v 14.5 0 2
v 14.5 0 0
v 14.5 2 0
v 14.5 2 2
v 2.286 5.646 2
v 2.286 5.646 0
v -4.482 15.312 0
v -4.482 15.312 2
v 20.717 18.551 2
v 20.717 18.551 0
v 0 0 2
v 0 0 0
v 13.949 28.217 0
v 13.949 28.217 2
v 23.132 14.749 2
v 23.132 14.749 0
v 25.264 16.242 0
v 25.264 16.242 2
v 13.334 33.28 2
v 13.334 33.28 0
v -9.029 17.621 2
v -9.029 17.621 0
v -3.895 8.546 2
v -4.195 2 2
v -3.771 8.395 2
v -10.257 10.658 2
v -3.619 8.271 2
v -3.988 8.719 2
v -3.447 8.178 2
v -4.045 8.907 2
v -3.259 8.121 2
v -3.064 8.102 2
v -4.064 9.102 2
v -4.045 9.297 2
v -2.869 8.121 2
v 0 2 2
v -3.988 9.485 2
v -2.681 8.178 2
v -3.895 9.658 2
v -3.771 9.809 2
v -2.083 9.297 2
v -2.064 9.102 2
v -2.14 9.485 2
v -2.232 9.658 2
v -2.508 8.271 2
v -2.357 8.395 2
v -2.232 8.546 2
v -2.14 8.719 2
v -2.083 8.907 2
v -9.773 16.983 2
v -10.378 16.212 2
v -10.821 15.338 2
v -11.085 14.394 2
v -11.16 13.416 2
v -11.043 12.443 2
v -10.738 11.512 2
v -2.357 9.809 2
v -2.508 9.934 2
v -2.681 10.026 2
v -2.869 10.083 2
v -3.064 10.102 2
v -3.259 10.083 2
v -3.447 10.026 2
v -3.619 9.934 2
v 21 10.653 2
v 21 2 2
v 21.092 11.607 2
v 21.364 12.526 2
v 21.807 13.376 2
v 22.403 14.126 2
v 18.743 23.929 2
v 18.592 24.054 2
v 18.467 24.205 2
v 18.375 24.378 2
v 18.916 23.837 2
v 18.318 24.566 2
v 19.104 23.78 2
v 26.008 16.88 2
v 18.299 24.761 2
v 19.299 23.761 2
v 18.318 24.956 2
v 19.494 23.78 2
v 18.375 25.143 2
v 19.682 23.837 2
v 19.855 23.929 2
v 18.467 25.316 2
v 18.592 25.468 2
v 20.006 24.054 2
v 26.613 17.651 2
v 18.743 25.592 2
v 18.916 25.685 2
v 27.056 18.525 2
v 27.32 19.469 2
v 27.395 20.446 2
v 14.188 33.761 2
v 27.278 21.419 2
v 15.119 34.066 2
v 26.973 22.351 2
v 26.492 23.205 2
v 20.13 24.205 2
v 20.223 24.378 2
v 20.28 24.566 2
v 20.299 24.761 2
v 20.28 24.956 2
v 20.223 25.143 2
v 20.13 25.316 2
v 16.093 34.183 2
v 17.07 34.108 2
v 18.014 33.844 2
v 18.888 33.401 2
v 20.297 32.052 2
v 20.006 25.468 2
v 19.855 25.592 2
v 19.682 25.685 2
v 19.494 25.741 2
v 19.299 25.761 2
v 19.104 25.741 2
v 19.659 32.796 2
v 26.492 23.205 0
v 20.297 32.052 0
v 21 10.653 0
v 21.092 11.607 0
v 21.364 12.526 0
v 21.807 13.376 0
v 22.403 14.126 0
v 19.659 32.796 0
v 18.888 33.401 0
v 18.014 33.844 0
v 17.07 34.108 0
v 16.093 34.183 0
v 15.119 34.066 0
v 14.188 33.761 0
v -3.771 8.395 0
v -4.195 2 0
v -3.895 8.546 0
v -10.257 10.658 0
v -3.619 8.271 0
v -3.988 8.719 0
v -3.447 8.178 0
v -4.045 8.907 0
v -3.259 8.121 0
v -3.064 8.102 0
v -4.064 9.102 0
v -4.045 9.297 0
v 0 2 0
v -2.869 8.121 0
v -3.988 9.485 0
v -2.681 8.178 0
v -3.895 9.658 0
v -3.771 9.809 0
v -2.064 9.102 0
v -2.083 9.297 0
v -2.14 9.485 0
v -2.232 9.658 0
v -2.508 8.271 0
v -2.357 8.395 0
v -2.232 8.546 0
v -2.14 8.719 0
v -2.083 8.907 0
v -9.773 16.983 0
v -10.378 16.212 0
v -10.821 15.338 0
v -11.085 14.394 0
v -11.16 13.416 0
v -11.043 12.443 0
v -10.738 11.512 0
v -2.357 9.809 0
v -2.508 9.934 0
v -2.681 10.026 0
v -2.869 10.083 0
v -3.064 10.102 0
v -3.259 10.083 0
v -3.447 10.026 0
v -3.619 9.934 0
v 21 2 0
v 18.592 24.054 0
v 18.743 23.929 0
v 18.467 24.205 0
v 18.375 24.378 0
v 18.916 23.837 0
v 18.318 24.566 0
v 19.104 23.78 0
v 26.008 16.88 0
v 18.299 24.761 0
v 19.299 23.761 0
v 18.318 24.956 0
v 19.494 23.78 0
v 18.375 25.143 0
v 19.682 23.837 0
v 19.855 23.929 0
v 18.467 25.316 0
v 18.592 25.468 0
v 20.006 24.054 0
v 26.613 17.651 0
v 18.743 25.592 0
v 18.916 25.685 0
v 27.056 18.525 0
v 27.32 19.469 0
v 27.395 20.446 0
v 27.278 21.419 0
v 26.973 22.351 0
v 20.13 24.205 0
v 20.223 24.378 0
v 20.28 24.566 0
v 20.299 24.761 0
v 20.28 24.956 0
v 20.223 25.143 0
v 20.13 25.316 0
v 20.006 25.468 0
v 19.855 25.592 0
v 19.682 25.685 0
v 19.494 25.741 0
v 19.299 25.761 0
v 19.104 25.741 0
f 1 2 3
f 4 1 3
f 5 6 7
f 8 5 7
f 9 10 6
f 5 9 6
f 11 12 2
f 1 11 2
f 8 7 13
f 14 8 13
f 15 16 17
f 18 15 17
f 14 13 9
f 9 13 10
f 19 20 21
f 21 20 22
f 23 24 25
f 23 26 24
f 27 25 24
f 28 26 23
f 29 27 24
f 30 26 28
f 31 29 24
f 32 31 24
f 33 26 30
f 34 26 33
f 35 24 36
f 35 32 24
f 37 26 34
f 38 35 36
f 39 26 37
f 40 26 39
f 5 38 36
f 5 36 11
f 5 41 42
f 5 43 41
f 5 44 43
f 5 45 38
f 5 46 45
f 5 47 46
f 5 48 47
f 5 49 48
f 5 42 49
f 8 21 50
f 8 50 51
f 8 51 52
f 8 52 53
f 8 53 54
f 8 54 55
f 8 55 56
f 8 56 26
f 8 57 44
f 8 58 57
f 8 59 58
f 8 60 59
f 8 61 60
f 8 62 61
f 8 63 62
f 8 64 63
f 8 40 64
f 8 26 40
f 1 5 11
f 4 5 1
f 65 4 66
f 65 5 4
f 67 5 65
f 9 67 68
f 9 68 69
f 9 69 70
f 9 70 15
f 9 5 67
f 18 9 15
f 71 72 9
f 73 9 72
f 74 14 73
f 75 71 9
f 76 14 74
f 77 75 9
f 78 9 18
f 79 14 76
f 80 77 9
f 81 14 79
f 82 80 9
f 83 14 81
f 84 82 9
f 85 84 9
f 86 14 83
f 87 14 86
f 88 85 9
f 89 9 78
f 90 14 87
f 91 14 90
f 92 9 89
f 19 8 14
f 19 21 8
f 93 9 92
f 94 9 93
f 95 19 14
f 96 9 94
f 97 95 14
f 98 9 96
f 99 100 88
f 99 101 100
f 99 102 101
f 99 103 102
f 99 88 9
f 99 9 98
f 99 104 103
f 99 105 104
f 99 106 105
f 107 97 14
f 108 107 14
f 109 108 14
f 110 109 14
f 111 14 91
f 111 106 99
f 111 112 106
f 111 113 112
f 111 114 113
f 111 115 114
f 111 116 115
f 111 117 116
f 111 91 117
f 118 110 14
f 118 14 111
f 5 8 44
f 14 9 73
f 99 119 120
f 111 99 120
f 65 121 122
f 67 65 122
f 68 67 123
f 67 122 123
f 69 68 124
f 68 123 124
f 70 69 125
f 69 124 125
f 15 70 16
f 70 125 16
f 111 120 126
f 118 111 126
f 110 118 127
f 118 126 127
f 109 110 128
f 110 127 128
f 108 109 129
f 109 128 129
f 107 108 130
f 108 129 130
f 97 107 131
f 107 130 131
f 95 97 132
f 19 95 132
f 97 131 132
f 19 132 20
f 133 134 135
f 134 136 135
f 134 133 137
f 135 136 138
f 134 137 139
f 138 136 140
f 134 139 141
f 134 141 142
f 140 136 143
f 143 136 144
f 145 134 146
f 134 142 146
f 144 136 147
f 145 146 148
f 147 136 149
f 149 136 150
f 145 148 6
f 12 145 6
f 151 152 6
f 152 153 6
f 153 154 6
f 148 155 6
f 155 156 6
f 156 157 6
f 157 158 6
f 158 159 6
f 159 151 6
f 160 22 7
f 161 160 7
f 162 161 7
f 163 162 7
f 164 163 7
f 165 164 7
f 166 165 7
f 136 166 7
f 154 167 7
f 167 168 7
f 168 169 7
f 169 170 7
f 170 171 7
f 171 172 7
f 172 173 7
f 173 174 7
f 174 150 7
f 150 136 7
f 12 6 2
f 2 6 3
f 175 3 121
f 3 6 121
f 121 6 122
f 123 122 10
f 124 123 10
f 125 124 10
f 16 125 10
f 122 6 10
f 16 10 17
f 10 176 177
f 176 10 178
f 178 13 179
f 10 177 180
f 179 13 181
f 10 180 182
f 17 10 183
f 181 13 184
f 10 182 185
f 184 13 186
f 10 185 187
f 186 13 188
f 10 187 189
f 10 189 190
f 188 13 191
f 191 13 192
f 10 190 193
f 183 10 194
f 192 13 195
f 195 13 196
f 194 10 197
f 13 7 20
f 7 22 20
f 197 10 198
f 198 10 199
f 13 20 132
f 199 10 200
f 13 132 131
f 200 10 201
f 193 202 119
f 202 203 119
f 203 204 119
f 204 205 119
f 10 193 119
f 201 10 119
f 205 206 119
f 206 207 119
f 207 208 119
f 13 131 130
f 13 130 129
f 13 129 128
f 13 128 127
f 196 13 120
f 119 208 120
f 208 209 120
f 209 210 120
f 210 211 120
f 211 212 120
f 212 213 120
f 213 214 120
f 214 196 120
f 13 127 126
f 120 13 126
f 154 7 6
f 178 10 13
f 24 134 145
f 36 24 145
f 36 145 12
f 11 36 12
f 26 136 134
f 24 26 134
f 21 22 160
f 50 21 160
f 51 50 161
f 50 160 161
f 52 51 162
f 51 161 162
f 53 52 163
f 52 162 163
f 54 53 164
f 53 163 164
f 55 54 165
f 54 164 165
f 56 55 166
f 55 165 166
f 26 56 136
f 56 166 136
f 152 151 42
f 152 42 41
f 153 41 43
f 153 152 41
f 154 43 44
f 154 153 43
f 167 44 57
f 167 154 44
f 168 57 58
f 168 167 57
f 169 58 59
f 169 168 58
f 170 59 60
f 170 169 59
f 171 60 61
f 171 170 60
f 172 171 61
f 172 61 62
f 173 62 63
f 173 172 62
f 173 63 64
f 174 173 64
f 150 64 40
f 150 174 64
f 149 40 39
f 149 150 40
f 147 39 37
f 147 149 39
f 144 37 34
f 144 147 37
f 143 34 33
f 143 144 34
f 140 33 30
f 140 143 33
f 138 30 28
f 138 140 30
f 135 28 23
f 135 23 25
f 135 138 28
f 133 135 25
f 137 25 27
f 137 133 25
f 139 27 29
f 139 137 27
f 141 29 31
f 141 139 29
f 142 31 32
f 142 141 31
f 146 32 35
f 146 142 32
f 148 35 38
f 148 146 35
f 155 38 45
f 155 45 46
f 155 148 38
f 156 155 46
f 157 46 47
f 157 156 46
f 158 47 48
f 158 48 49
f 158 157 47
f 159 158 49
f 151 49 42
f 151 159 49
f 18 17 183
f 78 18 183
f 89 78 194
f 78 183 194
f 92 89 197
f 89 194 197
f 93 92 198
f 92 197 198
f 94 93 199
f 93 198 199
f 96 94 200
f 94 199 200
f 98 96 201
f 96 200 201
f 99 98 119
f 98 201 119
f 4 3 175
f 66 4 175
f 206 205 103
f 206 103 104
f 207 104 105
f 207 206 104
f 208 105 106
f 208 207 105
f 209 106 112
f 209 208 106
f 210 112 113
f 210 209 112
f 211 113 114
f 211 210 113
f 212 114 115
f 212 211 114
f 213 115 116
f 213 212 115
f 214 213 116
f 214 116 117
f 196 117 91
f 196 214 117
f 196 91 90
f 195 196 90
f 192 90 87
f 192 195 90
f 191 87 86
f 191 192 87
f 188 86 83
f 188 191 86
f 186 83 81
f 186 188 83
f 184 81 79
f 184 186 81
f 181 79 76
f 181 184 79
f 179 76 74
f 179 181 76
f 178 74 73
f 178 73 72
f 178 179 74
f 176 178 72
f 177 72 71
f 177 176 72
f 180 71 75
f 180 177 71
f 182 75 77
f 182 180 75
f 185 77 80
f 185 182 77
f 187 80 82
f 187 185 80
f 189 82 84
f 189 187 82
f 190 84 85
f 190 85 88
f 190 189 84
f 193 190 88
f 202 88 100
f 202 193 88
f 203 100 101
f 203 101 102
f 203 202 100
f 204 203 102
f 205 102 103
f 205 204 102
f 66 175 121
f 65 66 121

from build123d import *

# Parameters (mm, degrees)
SKETCH1_R           = 1
BOSS_EXTRUDE1_DEPTH = 2


with BuildPart() as part:
    # Sketch1 → Boss-Extrude1 (new body)
    with BuildSketch(Plane.XY):
        with BuildLine():
            Line((0, 0), (14.5, 0))
            Line((14.5, 0), (14.5, 2))
            Line((14.5, 2), (21, 2))
            Line((21, 2), (21, 10.652873099))
            ThreePointArc((21, 10.652873099), (21.564945834, 12.961616165), (23.132117818, 14.74863332))
            Line((23.132117818, 14.74863332), (25.264156906, 16.241503161))
            ThreePointArc((25.264156906, 16.241503161), (27.320313489, 19.469022494), (26.492034945, 23.205145564))
            Line((26.492034945, 23.205145564), (20.297409433, 32.051987643))
            ThreePointArc((20.297409433, 32.051987643), (17.0698901, 34.108144226), (13.33376703, 33.279865682))
            Line((13.33376703, 33.279865682), (-9.02908378, 17.62122897))
            ThreePointArc((-9.02908378, 17.62122897), (-11.085240363, 14.393709637), (-10.256961819, 10.657586567))
            Line((-10.256961819, 10.657586567), (-4.194854443, 2))
            Line((-4.194854443, 2), (0, 2))
            Line((0, 2), (0, 0))
        make_face()
        with Locations((-3.063888841, 9.102047709)):
            Circle(SKETCH1_R, mode=Mode.SUBTRACT)
        with Locations((19.298961968, 24.760684422)):
            Circle(SKETCH1_R, mode=Mode.SUBTRACT)
        Polygon((-4.48202491, 15.311628218), (13.948896087, 28.217098036), (20.717098036, 18.551103913), (2.286177039, 5.645634095), align=None, mode=Mode.SUBTRACT)
    extrude(amount=BOSS_EXTRUDE1_DEPTH)


solid = part.part
